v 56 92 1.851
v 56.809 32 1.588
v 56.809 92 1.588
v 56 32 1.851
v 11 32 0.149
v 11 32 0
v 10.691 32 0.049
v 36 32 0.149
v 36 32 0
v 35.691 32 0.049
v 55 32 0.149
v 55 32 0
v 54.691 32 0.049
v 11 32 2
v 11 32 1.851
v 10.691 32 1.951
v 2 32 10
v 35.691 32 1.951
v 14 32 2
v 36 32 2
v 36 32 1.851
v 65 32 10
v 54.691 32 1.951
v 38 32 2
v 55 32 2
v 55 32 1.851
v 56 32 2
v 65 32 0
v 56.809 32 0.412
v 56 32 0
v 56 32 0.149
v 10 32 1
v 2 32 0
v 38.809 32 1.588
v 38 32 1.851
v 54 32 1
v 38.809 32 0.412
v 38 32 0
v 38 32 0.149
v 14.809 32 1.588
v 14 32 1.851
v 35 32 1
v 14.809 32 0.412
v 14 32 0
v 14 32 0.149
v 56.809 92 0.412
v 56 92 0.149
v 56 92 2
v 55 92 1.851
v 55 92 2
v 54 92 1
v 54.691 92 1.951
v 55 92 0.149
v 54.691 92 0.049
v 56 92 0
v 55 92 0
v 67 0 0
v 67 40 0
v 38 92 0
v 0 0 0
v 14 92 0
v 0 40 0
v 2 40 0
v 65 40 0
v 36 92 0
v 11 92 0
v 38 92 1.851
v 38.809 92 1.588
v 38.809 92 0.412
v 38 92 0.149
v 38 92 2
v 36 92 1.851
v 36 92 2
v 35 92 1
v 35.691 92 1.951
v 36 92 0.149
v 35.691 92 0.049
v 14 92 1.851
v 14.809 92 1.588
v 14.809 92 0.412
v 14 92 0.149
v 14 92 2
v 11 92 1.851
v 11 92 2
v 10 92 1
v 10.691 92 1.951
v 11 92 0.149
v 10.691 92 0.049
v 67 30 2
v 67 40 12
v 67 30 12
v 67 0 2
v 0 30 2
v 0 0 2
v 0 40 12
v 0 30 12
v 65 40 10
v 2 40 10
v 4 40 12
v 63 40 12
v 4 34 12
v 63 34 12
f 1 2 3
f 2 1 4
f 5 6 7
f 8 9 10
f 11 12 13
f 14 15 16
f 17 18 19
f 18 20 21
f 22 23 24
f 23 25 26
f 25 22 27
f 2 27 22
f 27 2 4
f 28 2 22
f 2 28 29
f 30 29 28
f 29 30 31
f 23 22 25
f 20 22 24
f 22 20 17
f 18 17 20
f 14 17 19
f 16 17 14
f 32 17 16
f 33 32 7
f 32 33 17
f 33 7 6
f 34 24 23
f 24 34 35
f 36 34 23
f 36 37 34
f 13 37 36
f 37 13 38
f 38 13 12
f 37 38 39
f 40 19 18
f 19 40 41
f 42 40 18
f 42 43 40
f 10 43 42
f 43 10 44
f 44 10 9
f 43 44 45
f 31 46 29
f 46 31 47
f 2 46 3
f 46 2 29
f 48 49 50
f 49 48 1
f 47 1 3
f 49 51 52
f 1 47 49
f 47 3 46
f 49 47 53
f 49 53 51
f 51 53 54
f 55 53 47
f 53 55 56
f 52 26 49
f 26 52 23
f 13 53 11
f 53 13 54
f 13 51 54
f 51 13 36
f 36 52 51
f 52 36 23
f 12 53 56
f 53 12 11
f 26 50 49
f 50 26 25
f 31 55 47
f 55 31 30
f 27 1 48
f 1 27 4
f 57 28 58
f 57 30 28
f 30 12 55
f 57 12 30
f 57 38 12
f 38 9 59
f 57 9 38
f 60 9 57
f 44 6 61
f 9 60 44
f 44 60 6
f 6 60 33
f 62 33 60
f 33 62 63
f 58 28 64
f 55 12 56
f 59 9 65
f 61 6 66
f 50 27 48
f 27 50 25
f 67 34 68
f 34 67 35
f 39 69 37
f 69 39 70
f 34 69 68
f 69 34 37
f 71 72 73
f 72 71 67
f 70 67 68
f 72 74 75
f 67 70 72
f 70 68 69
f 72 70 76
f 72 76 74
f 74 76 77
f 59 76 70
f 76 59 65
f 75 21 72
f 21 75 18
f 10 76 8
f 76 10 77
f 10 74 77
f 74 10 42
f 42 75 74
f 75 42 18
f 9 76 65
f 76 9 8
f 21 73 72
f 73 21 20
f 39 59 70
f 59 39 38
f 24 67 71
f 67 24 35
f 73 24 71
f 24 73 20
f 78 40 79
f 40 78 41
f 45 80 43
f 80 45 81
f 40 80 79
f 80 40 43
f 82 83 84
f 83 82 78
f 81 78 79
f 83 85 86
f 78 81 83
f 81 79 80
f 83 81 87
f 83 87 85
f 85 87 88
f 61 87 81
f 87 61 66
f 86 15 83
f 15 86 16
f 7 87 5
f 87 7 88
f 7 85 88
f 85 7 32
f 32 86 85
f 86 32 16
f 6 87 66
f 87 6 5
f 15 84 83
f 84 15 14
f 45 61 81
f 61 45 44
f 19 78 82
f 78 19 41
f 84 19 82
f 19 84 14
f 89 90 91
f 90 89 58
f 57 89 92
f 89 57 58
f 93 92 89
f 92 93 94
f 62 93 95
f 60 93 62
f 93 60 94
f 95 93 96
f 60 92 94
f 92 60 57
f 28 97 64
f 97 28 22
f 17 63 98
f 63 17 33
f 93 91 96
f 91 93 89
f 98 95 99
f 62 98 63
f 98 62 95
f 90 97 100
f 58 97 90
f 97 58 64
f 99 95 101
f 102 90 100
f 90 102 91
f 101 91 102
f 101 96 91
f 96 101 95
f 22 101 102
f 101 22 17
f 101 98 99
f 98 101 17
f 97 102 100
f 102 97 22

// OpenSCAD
// file: ../etc/corner-hole.scad
module ellipsis(w, h) {
	translate([w / 2, h / 2, 0])
		resize([w, h, 1024])
			cylinder(1024, 1024, 1024);
}
module cornerHole(base, m, in, out, height) {
	delta = (out - in) / 2;
		translate([m,					m,					0])	ellipsis(in, in);
		translate([base[0] - m,	m,					0])	ellipsis(in, in);
		translate([base[0] - m,	base[1] - m,		0])	ellipsis(in, in);
		translate([m,					base[1] - m,		0])	ellipsis(in, in);

		translate([m - delta,					m - delta,					height])	ellipsis(out, out);
		translate([base[0] - m  - delta,	m - delta,					height])	ellipsis(out, out);
		translate([base[0] - m  - delta,	base[1] - m - delta,	height])	ellipsis(out, out);
		translate([m - delta,					base[1] - m - delta,	height])	ellipsis(out, out);
}
// file: ../../common/library.scad
// 라이브러리, 검증된 것만 이곳에
use <MCAD/boxes.scad>
include <utils.scad>

// 대칭 사다리꼴, xz 평면에서 보았을 때
module cube_type_1(v, x) {
	rotate([0, -90, -90])
	linear_extrude(v.y)
	polygon([
		[0,		0],
		[0,		v.x],
		[v.z,	v.x - (v.x - x) / 2],
		[v.z,	(v.x - x) / 2],
		[0,		0]
	]);
}

// 한쪽으로만(x축 방향으로만) 늘어나는(또는 줄어드는) 사다리꼴-하나는 직각 유지, xz 평면에서 보았을 때
module cube_type_2(v, x) {
	rotate([0, -90, -90])
	linear_extrude(v.y)
	polygon([
		[0,		0],
		[0,		v.x],
		[v.z,	x],
		[v.z,	0],
		[0,		0]
	]);
}
// 치수 표시
module note_type_1(vs, ve, centered = false, fs, detail = false) {
	x = vs.x;
	y = vs.y;
	z = vs.z;
	mm = " mm";	//	"㎜";
	center = centered ? [-vs.x / 2, -vs.y / 2, -vs.z / 2] : [0, 0, 0];
	%color("Black")
	translate(center)
	{
		// x, z view
		xyfs = is_undef(fs) ? max(1, min(min(x, y) / 16, 20)) : 1;
		translate([x / 2, y - xyfs * 1.5, z + EPSILON])
			linear_extrude(EPSILON, center = true)	text(str(ve.x, mm), size = xyfs, halign = "center", language = "kr", font = "NanumGothic");
		translate([x / 2, xyfs * 1.5, z + EPSILON])
			rotate([0, 0, 180])
			linear_extrude(EPSILON, center = true)	text(str(ve.x, mm), size = xyfs, halign = "center", language = "kr", font = "NanumGothic");

		// x, -z view
		if (detail) {
			translate([x / 2, xyfs * 1.5, -EPSILON])
				rotate([180, 0, 0])
				linear_extrude(EPSILON, center = true)	text(str(x, mm), size = xyfs, halign = "center", language = "kr", font = "NanumGothic");
			translate([x / 2, y - xyfs * 1.5, -EPSILON])
				rotate([180, 0, 180])
				linear_extrude(EPSILON, center = true)	text(str(x, mm), size = xyfs, halign = "center", language = "kr", font = "NanumGothic");
		}

		zxfs = is_undef(fs) ? max(1, min(min(z, x) / 16, 20)) : 1;
		// x, y view
		if (detail) {
			translate([x / 2, y + EPSILON, z - zxfs * 1.5])
				rotate([90, 0, 180])
				linear_extrude(EPSILON, center = true)	text(str(ve.x, mm), size = zxfs, halign = "center", language = "kr", font = "NanumGothic");
			translate([x / 2, y + EPSILON, zxfs * 1.5])
				rotate([90, 180, 180])
				linear_extrude(EPSILON, center = true)	text(str(x, mm), size = zxfs, halign = "center", language = "kr", font = "NanumGothic");
		}

		// x, -y view
		translate([x / 2, -EPSILON, z - zxfs * 1.5])
			rotate([90, 0, 0])
			linear_extrude(EPSILON, center = true)	text(str(ve.x, mm), size = zxfs, halign = "center", language = "kr", font = "NanumGothic");
		translate([x / 2, -EPSILON, zxfs * 1.5])
			rotate([90, 180, 0])
			linear_extrude(EPSILON, center = true)	text(str(x, mm), size = zxfs, halign = "center", language = "kr", font = "NanumGothic");

		yzfs = is_undef(fs) ? max(1, min(min(y, z) / 16, 20)) : 1;
		// y, x view
		if (detail) {
			translate([x + EPSILON, y / 2, z - yzfs * 1.5])
				rotate([90, 0, 90])
				linear_extrude(EPSILON, center = true)	text(str(ve.y, mm), size = yzfs, halign = "center", language = "kr", font = "NanumGothic");
			translate([x + EPSILON, y / 2, yzfs * 1.5])
				rotate([-90, 0, -90])
				linear_extrude(EPSILON, center = true)	text(str(y, mm), size = yzfs, halign = "center", language = "kr", font = "NanumGothic");
		}

		// y, -x view
		translate([-EPSILON, y / 2, yzfs * 1.5])
			rotate([-90, 0, 90])
			linear_extrude(EPSILON, center = true)	text(str(y, mm), size = yzfs, halign = "center", language = "kr", font = "NanumGothic");
		translate([-EPSILON, y / 2, z - yzfs * 1.5])
			rotate([90, 0, -90])
			linear_extrude(EPSILON, center = true)	text(str(ve.y, mm), size = yzfs, halign = "center", language = "kr", font = "NanumGothic");

		// y, z view
		translate([(x - ve.x) / 2 + xyfs * 1.5, y / 2, z + EPSILON])
			rotate([0, 0, 90])
			linear_extrude(EPSILON, center = true)	text(str(ve.y, mm), size = xyfs, halign = "center", language = "kr", font = "NanumGothic");
		translate([x - (x - ve.x) / 2 - xyfs * 1.5, y / 2, z + EPSILON])
			rotate([0, 0, -90])
			linear_extrude(EPSILON, center = true)	text(str(ve.y, mm), size = xyfs, halign = "center", language = "kr", font = "NanumGothic");

		// y, -z view
		if (detail) {
			translate([x - xyfs * 1.5, y / 2, -EPSILON])
				rotate([180, 0, 90])
				linear_extrude(EPSILON, center = true)	text(str(y, mm), size = xyfs, halign = "center", language = "kr", font = "NanumGothic");
			translate([xyfs * 1.5, y / 2, -EPSILON])
				rotate([180, 0, -90])
				linear_extrude(EPSILON, center = true)	text(str(y, mm), size = xyfs, halign = "center", language = "kr", font = "NanumGothic");
		}

		// z, x view
		if (detail) {
			translate([x + EPSILON, y - yzfs * 1.5, z / 2])
				rotate([90, 90, 90])
				linear_extrude(EPSILON, center = true)	text(str(ve.z, mm), size = yzfs, halign = "center", language = "kr", font = "NanumGothic");
			translate([x + EPSILON, yzfs * 1.5, z / 2])
				rotate([90, -90, 90])
				linear_extrude(EPSILON, center = true)	text(str(z, mm), size = yzfs, halign = "center", language = "kr", font = "NanumGothic");
		}

		// z, -x view
		translate([-EPSILON, yzfs * 1.5, z / 2])
			rotate([-90, 90, 90])
			linear_extrude(EPSILON, center = true)	text(str(z, mm), size = yzfs, halign = "center", language = "kr", font = "NanumGothic");
		translate([-EPSILON, y - yzfs * 1.5, z / 2])
			rotate([-90, -90, 90])
			linear_extrude(EPSILON, center = true)	text(str(ve.z, mm), size = yzfs, halign = "center", language = "kr", font = "NanumGothic");

		// z, y view
		if (detail) {
			translate([x - zxfs * 1.5, y + EPSILON, z / 2])
				rotate([-90, -90, 0])
				linear_extrude(EPSILON, center = true)	text(str(ve.z, mm), size = zxfs, halign = "center", language = "kr", font = "NanumGothic");
			translate([zxfs * 1.5, y + EPSILON, z / 2])
				rotate([-90, 90, 0])
				linear_extrude(EPSILON, center = true)	text(str(z, mm), size = zxfs, halign = "center", language = "kr", font = "NanumGothic");
		}

		// z, -y view
		translate([zxfs * 1.5, -EPSILON, z / 2])
			rotate([90, -90, 0])
			linear_extrude(EPSILON, center = true)	text(str(z, mm), size = zxfs, halign = "center", language = "kr", font = "NanumGothic");
		translate([x - zxfs * 1.5, -EPSILON, z / 2])
			rotate([90, 90, 0])
			linear_extrude(EPSILON, center = true)	text(str(ve.z, mm), size = zxfs, halign = "center", language = "kr", font = "NanumGothic");
	}
}

module samples() {
	//	cube_type_1
	color("white", 1.0)	cube_type_1([16, 32, 4], 12);
	note_type_1([16, 32, 4], [12, 32, 4]);
	
	//	cube_type_2
	translate([20, 0, 0]) {
		color("yellow", 1.0)	cube_type_2([16, 32, 4], 20);
		note_type_1([16, 32, 4], [12, 32, 4]);
	}
}
samples();
// file: landscape.scad
use <MCAD/boxes.scad>
use <common.scad>
use <../etc/corner-hole.scad>
use <../../common/utils.scad>

PALETTE = [
	[0.3, 0.1, 0.0, 0.5],	//	갈색, 칼손잡이
	[0.5, 0.5, 0.5, 0.5],	//	회색, 칼날
	[0.9, 0.9, 0.9, 1.0],	//	흰색, 상판
	[0.0, 0.0, 0.9, 0.5],	//	파랑
	[0.0, 0.0, 0.0, 0.0]	//	검정 투명, 호환성 예약
];
ZERO = [0, 0, 0];
EPSILON = 0.01;

// export
function landscapeSize(thick, margin, delta)  = coreSize(delta, thick) + [margin * 2, margin * 2, 0];
module chefsKnife(p, q) {
	difference() {
		union() {
			color("White", 1.0)	cube(p, true);
			note(p[0], p[1], p[2], true);
		}
		translate([0, 0, -p[2] / 1.8])
			rotate([15, 0, 0]) {
				cube([p[0] + 1, p[1], p[2] * 2], true);
			}
	}
	translate([0, (p[1] - q[1]) / 2, p[2] / 2 + q[2] / 2]) cube(q, true);
}
module landscape(thick, margin, delta, prototype) {
	base =  landscapeSize(thick, margin, delta);	//	상판

	chefsInfo = chefsInfo();
	difference() {
		union() {
			//	상판
			translate([base[0] / 2, base[1] / 2, thick / 2])
			{
				roundedBox(base, 2, true);
				note(base[0], base[1], base[2], true);
			}
			
			//	서명
			color(c=PALETTE[1])
				translate([base[0] - margin / 2 - 2, margin / 4, thick])
				mark("andold", 0.2, 1);

			//	손잡이
			translate([margin + chefsInfo[0] - thick, margin - thick, 0])
			{
				x = chefsInfo[1] + thick * 2;
				y = base[1] / 2;
				z = thick * 2;
				roundedBoxNotCenter([x, y, z], 2, true);
				note(x, y, z);
			}
		}
		translate([margin, margin, -EPSILON])	punch(60, 16 + EPSILON * 2, 8);
	}

	p = [4, 46, 235];
	q = [20, 32, 64];
	%translate([chefsInfo[0] + margin + 44.5, margin + 23.5, -p[2] / 2 + thick * 2 + 1])
		rotate([0, 0, 180])
		chefsKnife(p, q);
}

thick = 8;
margin = 12;
delta = 8;
prototype = false;
module build(thick, margin, delta, prototype) {
	echo("landscape build start: ", thick, margin, delta, prototype);

	scale = prototype ? [1/2, 1/2, 1/2] : [1, 1, 1];
	scale(scale) {
		landscape(thick, margin, delta, prototype);
	}

	echo("landscape build done: ", thick, margin, delta, prototype);
}

build(thick, margin, delta, prototype);
// file: common.scad
use <MCAD/boxes.scad>
use <../etc/corner-hole.scad>
use <../etc/utils.scad>

PALETTE = [
	[0.3, 0.1, 0.0, 1.0],	//	갈색, 칼손잡이
	[0.5, 0.5, 0.5, 0.5],	//	회색, 칼날
	[0.9, 0.9, 0.9, 1.0],	//	흰색, 상판
	[0.0, 0.0, 0.9, 0.5],	//	파랑
	[0.0, 0.0, 0.0, 0.0]	//	검정 투명, 호환성 예약
];
ZERO = [0, 0, 0];
HALF = [1/2, 1/2, 1/2];
ONE = [1, 1, 1];
EPSILON = 0.1;

// export
function chefsInfo(delta = 8)  = [(3 + 3 + 3) + (16 + 16) + delta * 5, (3 + 4 + 5) + (15 + 20)];	//	[x위치, 길이]
function coreWidth(delta = 8)  = (3 + 3 + 3) + (16 + 16) + delta * 5 + chefsInfo(delta)[1];
function coreSize(delta = 8, thick = 8)  = [coreWidth(delta), 60, thick];

module test(delta = 4) {
	a = [];
	dx = 0;
	for (cx = [0:delta: 256]) {
		dx = dx + delta;
		a = concat(a, [dx]);
		echo(dx, a);
	}
}
//test();

module	roundedBoxNotCenter(size = [32, 64, 8], radius = 8, sidesonly = true) {
	translate([size[0] / 2, size[1] / 2, size[2] / 2])		roundedBox(size, radius, sidesonly);
}

// export
module punch(height = 60, thick = 8, delta = 8) {
	// 과도, 빵칼
	breadStart = 0;
	translate([breadStart, 0, 0])					roundedBoxNotCenter([3, height, thick], 1);
	translate([breadStart + (3 + delta), 0, 0])		roundedBoxNotCenter([3, height, thick], 1);
	translate([breadStart + (3 + delta) * 2, 0, 0])	roundedBoxNotCenter([3, height, thick], 1);
	breadLength = (3 + delta) * 2 + 3;

	// 가위
	scissorStart = breadStart + breadLength + delta;
	scissor = [16, 40];
	translate([scissorStart,						(height - scissor[1]) / 2, 0])	ellipsis(scissor[0], scissor[1], thick);
	translate([scissorStart + scissor[0] + delta,	(height - scissor[1]) / 2, 0])	ellipsis(scissor[0], scissor[1], thick);
	scissorLength = scissor[0] * 2 + delta;
	
	//	식도
	chefsStart = scissorStart + scissorLength + delta;
	translate([chefsStart, 0, 0])						roundedBoxNotCenter([3, height, thick], 1);
	translate([chefsStart + 3 + 15, 0, 0])				roundedBoxNotCenter([4, height, thick], 1);
	translate([chefsStart + (3 + 4) + (15 + 20), 0, 0])	roundedBoxNotCenter([5, height, thick], 1);
	chefsLength = (3 + 4 + 5) + (15 + 20);
	echo("last x position, ie width", delta, breadStart, breadLength, scissorStart, scissorLength, chefsStart, chefsLength);
}
punch();
// main file
//	손잡이 등받이 #18
use <common.scad>
use <landscape.scad>
use <../../common/library.scad>

module punches(height = 2) {
	thick = 60;
	chefsStart = 0;
	translate([chefsStart, 0, 0])						roundedBoxNotCenter([3, height, thick], 1);
	translate([chefsStart + 3 + 15, 0, 0])				roundedBoxNotCenter([4, height, thick], 1);
	translate([chefsStart + (3 + 4) + (15 + 20), 0, 0])	roundedBoxNotCenter([5, height, thick], 1);
}
module back_of_knife(thick = 2, step = 0) {
	param = [
		63, //	칼손잡이 받침대 가로 길이
		8,	//	칼손잡이 받침대 상판 윗면기준으로 높이
		8,	//	칼손잡이 받침대 구멍기준으로 앞쪽 가장자리까지의 거리
		8,	//	칼손잡이 받침대 맨 왼쪽 구멍기준으로 왼쪽 가장자리까지의 거리
		8,	//	칼손잡이 받침대 맨 오른쪽 구멍기준으로 오른쪽 가장자리까지의 거리
		47,	//	구멍들의 가로 길이
		2,	//	구멍들속에 들어가는 높이
		0	//	reserved
	];
	base = [63, 60, 8];
	height = 32;

	// 상판 참조용
	if ($preview) {
		%translate([144 + thick, 48 + (8 - step), 8 + param[6]])
			rotate([90, 180, 0])
			landscape(8, 8, 12);
	}
	
	// 구멍들
	translate([param[0] + thick, 60 + height, param[6]])
		rotate([90, 180, 0])
		translate([param[3], 0, 0])
		punches(param[6]);
	
	// 등받이
	cube([base[0] + thick * 2, height, param[6]]);
	
	//	앞쪽까지
	translate([thick, height - thick, thick])	cube([param[0], thick, param[2]]);

	//	아래쪽으로
	translate([0, height - thick, 0])	cube([thick, param[2] + thick, param[1] + thick]);
	translate([param[0] + thick, height - thick, 0])	cube([thick, param[2] + thick, param[1] + thick]);
	
	// 덮개 앞쪽
	translate([param[0] + thick * 2, height - thick, param[1] + thick])
		rotate([0, 0, 90])
		cube_type_2([thick, param[0] + thick * 2, thick], thick * 2);
	// 덮개 옆쪽
	translate([0, height - thick, param[1] + thick])
		cube_type_2([thick, param[2] + thick, thick], thick * 2);
	translate([param[0] + thick * 2, (param[2] + thick) + height - thick, param[1] + thick])
		rotate([0, 0, 180])
		cube_type_2([thick, param[2] + thick, thick], thick * 2);

}

module samples() {
	echo("$fn=", $fn);
	back_of_knife();
}

module build(renderMode = false) {
	if (renderMode) {
		$fn = 256;
		back_of_knife();
	} else {
		samples();
	}
}
build();
